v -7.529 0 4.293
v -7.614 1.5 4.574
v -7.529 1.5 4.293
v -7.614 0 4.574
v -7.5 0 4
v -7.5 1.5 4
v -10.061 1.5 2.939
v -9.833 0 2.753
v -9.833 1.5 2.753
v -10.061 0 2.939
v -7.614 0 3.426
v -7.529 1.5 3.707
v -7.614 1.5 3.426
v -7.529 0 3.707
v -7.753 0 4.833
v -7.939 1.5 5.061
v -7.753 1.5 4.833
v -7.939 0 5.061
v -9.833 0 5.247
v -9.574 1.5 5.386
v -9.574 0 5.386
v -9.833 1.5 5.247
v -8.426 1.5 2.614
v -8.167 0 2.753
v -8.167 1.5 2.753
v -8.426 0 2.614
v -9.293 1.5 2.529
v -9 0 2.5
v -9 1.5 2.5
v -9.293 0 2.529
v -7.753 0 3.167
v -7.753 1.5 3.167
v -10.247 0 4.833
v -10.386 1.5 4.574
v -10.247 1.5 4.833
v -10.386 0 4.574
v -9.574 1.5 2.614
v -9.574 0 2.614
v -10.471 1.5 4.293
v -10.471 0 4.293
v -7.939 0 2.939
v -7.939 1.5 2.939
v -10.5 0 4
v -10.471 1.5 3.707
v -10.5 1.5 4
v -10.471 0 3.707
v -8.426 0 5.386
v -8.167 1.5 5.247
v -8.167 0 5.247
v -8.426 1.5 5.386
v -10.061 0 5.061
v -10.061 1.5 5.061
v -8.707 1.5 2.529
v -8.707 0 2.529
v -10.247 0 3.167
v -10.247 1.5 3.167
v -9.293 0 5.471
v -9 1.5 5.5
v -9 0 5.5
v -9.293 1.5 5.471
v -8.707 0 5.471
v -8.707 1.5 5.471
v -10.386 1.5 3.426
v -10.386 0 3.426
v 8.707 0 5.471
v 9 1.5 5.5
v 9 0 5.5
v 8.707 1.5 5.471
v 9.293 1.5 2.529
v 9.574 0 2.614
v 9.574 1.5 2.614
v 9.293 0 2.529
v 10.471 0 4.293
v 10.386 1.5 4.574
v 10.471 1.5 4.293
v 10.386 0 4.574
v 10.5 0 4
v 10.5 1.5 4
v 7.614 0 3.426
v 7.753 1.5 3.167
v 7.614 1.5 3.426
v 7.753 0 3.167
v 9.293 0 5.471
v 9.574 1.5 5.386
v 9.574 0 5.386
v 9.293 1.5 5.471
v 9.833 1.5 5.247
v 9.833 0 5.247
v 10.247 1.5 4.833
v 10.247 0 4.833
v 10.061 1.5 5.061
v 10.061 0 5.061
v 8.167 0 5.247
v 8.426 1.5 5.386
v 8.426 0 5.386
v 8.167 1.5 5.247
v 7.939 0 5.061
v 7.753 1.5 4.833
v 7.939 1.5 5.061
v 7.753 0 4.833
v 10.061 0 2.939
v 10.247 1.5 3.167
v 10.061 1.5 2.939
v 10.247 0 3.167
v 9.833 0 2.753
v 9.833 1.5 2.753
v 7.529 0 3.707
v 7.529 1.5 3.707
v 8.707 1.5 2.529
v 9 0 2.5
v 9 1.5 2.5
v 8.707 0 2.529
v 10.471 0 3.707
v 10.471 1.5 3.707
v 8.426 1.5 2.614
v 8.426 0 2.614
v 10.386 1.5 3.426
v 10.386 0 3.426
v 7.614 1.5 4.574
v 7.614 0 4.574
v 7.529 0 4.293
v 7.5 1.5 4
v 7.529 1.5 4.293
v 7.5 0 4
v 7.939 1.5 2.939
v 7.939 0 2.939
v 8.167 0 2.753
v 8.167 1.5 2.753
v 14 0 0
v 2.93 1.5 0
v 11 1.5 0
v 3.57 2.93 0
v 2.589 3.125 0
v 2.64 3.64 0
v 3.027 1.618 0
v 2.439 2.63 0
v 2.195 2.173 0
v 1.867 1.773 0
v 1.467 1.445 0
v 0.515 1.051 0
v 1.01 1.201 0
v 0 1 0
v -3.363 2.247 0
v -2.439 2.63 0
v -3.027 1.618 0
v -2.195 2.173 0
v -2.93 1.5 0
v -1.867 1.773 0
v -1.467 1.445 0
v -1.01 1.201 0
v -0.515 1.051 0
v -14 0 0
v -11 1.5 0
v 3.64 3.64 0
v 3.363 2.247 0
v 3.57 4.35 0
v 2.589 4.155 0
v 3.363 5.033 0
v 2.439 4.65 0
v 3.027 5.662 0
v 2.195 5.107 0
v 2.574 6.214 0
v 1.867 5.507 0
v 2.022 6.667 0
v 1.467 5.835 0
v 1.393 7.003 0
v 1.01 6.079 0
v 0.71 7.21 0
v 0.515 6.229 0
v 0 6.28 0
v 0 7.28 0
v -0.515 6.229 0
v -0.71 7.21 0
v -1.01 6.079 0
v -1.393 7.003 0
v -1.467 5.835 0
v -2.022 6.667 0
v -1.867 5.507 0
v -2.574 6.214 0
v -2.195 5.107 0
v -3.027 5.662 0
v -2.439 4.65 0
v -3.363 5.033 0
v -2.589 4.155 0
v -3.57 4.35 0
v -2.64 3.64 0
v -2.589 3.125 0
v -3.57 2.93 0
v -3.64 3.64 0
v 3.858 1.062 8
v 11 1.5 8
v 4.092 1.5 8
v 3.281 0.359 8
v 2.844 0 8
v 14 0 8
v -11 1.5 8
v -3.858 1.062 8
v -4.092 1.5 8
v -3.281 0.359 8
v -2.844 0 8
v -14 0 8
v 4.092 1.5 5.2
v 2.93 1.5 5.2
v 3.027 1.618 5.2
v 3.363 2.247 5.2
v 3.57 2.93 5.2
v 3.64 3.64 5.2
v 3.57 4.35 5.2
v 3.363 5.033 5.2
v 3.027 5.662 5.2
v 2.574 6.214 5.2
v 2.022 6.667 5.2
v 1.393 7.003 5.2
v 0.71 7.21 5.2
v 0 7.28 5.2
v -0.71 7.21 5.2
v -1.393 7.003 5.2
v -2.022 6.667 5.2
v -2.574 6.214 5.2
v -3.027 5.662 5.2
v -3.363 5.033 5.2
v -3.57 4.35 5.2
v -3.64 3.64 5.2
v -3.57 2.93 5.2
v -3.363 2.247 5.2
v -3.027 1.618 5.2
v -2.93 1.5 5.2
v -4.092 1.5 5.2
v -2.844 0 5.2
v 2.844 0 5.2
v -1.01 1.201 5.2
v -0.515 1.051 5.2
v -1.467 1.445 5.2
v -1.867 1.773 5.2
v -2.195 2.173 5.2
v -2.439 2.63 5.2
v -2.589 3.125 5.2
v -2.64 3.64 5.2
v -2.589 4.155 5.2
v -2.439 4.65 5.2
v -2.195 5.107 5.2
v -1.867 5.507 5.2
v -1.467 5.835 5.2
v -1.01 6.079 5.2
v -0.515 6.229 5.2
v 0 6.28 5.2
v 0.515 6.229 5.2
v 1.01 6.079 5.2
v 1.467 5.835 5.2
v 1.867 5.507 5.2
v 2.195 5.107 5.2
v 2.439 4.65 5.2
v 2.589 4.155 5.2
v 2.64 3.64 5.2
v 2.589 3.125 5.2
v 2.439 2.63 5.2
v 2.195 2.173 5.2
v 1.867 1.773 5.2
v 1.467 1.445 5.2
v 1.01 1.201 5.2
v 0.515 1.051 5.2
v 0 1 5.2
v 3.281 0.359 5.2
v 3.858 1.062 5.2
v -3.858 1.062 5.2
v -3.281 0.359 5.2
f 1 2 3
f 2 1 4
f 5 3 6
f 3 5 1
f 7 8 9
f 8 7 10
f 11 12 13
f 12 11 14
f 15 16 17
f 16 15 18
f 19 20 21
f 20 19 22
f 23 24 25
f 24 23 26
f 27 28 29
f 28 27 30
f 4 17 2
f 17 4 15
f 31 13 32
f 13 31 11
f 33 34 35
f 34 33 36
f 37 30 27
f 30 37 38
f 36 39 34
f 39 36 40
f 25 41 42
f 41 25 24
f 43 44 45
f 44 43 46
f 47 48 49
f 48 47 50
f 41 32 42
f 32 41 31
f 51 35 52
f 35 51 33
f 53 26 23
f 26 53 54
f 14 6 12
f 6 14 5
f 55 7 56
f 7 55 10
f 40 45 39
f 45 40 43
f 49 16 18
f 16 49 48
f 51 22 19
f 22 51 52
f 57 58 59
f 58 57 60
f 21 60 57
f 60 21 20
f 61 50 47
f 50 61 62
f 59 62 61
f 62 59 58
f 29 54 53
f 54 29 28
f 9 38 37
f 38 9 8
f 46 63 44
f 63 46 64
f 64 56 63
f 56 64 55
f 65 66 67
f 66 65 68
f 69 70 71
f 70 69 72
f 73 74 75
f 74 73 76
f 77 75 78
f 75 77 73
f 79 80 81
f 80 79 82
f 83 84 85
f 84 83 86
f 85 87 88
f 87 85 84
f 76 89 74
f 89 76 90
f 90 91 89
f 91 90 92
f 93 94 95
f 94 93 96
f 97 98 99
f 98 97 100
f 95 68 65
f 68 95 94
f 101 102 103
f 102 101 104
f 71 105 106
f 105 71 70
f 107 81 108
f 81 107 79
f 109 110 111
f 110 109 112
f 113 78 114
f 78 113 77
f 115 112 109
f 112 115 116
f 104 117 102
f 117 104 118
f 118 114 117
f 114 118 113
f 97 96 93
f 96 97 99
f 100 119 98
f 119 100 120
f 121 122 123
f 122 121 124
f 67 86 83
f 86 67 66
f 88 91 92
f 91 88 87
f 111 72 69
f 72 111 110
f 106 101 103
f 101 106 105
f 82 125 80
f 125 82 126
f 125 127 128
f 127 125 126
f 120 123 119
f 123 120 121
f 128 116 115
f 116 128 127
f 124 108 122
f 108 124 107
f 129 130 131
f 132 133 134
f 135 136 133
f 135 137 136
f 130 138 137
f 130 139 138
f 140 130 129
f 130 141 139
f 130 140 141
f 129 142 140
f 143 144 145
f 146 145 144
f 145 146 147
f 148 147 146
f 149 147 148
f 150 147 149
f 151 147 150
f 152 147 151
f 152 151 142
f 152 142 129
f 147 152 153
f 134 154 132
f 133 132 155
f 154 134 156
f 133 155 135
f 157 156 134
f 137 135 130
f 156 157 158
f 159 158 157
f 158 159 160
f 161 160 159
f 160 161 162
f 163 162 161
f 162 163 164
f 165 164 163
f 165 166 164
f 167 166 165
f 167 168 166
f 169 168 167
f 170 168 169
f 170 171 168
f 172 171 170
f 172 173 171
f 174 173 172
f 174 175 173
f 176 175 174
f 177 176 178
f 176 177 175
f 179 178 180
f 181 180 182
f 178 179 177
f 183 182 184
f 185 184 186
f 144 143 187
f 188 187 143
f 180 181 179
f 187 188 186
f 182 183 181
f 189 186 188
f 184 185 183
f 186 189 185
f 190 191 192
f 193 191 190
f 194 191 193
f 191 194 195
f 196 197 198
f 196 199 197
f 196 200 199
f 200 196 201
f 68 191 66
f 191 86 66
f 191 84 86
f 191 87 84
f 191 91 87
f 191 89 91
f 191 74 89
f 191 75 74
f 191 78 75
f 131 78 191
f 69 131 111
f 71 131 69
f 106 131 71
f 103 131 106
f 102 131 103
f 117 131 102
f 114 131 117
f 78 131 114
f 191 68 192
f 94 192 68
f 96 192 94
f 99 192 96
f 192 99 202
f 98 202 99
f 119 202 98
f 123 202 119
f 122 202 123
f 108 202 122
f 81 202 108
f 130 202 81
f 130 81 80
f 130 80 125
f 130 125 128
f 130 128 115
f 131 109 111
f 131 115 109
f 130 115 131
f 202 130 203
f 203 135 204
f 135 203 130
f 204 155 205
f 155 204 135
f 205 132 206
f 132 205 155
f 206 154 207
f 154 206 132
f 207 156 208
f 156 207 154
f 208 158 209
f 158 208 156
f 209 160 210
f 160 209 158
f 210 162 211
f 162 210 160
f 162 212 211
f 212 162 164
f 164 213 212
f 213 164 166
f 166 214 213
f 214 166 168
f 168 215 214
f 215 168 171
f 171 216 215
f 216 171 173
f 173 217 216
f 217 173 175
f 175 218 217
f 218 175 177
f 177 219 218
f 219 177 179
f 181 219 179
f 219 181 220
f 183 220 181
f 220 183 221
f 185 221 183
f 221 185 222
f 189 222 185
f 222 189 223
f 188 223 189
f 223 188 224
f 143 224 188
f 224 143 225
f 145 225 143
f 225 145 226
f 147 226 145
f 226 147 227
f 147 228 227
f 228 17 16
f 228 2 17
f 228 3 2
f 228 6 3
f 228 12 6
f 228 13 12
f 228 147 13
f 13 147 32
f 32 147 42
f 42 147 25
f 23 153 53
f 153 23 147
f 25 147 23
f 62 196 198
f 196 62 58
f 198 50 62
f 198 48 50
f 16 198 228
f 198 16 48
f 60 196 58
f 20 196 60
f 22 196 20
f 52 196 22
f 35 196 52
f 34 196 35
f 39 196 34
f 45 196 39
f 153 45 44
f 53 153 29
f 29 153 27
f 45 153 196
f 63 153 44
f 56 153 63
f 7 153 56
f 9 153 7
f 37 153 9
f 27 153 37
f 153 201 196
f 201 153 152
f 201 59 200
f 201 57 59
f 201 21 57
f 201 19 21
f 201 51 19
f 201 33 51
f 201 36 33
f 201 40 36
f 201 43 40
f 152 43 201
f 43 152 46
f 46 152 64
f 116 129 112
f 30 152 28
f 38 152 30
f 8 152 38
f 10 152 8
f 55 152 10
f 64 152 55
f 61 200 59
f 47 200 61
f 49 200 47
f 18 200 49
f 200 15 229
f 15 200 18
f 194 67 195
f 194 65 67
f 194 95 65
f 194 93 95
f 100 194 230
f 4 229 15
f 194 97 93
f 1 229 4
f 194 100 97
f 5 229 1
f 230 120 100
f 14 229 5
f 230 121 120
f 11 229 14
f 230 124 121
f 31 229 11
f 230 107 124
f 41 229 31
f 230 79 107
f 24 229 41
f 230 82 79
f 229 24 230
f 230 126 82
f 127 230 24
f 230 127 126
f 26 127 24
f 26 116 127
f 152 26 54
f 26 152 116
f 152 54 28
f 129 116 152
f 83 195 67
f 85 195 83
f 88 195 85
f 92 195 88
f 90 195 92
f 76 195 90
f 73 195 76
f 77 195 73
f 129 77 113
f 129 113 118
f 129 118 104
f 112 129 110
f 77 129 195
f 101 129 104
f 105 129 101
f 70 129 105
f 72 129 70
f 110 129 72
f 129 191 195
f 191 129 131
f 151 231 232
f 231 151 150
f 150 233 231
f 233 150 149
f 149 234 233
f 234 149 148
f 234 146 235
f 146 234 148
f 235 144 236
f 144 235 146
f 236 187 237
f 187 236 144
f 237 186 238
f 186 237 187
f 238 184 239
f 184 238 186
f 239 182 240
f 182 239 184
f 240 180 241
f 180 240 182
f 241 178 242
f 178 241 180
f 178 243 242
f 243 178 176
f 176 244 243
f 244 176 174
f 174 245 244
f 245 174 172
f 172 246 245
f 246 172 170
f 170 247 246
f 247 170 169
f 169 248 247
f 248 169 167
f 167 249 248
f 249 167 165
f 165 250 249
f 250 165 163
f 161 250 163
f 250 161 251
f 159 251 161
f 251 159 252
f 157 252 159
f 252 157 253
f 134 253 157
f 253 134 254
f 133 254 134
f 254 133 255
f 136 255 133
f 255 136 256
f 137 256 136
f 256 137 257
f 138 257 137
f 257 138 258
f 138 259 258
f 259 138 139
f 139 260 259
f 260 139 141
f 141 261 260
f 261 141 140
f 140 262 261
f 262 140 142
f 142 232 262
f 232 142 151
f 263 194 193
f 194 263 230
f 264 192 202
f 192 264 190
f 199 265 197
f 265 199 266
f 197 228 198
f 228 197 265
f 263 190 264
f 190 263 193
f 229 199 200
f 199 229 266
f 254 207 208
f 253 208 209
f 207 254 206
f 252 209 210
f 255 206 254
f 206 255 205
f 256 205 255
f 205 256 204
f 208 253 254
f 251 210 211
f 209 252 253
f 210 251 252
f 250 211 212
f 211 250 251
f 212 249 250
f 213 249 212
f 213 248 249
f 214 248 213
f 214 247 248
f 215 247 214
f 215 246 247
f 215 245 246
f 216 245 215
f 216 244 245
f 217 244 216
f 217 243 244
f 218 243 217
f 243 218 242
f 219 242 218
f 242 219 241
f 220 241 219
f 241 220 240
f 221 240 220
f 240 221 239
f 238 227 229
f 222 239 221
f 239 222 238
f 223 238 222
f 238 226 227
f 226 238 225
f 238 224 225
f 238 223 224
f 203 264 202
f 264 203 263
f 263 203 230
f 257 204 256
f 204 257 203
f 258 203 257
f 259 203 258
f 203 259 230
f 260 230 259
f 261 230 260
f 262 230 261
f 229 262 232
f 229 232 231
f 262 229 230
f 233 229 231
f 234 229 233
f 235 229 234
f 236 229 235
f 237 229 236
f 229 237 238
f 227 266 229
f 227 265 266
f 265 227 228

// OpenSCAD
ledWrapThickness = 1;
baseThickness = 1.5;
ledDiameter = 5;
ledTolerance = 0.14;
ledLengthToHold = 5.2;
stripWidth = 8;
screwHole = 3;
screwHoleDistanceFromEnd = 5;
length = 28;

$fn = 32;

module main() {
    cy = ledDiameter/2+ledTolerance+2*ledWrapThickness-ledWrapThickness;
    difference() {
        linear_extrude(height=stripWidth)
        difference() {
            union() {
                polygon([[-length/2,0],[length/2,0],[length/2-baseThickness*2,baseThickness],[-length/2+baseThickness*2,baseThickness]]);
                translate([0,cy]) circle(d=ledDiameter+2*ledTolerance+2*ledWrapThickness);
            }
            translate([0,ledDiameter/2+ledTolerance+2*ledWrapThickness-ledWrapThickness]) 
        circle(d=ledDiameter+2*ledTolerance);
        }
        translate([0,cy,ledLengthToHold])
        cylinder(d=ledDiameter+2*ledTolerance+4*ledWrapThickness,h=stripWidth);
        if (screwHole) {
            x = length/2 - screwHoleDistanceFromEnd;
            for (i=[-1,1]) 
                #translate([i*x,0,stripWidth/2]) rotate([90,0,0]) cylinder(d=screwHole,h=4*baseThickness,center=true);
        }
    }
}

main();
